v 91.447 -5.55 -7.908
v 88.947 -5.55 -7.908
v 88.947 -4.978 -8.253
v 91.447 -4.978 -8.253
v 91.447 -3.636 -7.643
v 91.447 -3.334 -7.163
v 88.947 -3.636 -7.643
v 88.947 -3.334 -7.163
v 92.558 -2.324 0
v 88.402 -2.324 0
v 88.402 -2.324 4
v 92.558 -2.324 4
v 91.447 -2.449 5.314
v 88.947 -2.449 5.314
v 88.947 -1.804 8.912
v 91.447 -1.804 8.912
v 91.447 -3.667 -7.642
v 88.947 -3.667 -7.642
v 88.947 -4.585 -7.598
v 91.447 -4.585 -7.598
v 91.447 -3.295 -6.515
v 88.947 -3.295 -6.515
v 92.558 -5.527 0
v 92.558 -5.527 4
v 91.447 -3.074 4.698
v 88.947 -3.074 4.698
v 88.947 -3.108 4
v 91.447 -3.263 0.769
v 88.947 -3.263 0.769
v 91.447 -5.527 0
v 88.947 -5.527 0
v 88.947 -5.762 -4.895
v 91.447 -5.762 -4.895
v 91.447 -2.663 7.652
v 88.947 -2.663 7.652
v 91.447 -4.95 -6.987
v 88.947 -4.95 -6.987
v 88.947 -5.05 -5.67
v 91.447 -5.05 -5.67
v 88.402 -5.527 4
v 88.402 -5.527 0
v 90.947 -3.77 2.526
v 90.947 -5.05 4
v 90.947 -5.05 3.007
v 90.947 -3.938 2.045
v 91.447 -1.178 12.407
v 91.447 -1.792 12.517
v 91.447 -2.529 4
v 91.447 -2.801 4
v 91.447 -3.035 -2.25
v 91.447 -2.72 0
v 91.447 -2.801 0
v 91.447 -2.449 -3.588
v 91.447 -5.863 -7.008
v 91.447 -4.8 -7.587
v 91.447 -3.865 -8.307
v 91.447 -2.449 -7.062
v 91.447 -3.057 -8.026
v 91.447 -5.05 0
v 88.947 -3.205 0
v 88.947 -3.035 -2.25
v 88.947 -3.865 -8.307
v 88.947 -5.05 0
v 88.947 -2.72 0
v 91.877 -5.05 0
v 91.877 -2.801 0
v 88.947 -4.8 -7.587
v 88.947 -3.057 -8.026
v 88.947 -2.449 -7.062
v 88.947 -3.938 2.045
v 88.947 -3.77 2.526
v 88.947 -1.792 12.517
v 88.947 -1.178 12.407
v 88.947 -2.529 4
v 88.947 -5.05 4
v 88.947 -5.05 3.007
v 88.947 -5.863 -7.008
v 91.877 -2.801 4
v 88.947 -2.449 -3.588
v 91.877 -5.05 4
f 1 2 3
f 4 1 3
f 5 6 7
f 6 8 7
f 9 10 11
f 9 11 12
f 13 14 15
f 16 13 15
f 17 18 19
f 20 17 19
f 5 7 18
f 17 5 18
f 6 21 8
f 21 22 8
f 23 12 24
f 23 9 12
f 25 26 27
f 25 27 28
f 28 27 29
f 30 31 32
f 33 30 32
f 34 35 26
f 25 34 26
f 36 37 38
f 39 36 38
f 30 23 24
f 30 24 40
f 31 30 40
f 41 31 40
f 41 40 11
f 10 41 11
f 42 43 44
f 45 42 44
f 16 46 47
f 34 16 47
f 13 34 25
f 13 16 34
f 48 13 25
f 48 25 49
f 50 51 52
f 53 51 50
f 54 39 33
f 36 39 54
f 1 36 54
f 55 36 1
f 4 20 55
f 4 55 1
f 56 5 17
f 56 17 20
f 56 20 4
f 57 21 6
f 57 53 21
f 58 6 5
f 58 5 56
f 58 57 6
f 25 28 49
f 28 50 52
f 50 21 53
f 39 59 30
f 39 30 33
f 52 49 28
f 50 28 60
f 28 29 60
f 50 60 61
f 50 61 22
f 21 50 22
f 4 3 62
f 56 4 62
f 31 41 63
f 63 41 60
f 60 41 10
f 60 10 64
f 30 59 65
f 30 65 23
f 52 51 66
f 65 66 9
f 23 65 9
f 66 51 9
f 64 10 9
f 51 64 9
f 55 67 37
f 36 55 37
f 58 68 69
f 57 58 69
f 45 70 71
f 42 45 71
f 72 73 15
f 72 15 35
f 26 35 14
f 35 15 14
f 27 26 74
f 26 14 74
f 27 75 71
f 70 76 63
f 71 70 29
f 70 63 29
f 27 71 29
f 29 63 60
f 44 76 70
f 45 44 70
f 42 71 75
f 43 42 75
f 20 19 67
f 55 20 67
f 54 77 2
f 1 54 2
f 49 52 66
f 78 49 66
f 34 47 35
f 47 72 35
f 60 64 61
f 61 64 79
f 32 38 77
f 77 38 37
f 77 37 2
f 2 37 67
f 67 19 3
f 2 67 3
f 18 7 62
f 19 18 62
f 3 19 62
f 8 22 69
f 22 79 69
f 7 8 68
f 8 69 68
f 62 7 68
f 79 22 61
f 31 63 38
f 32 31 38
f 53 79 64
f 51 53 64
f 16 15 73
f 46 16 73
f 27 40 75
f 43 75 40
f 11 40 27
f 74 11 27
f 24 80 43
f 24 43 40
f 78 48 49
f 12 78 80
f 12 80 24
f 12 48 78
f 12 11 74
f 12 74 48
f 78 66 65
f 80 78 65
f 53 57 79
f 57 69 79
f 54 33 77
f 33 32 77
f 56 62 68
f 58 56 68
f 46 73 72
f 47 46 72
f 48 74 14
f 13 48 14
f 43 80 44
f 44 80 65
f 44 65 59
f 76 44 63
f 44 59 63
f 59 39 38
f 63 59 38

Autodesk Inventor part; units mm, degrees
ref_plane "YZ Plane" through (0, 0, 0) normal (1, 0, 0) x (0, 1, 0)
ref_plane "XZ Plane" through (0, 0, 0) normal (0, 1, 0) x (-1, 0, 0)
ref_plane "XY Plane" through (0, 0, 0) normal (0, 0, 1) x (1, 0, 0)
sketch "Sketch1" plane through (0, 0, 0) normal (0, 0, 1) x (1, 0, 0)
  line L0 (92.558, -5.5266) -> (88.4016, -5.5266)
  line L1 (88.4016, -5.5266) -> (88.4016, -2.3241)
  line L2 (88.4016, -2.3241) -> (92.558, -2.3241)
  line L3 (92.558, -2.3241) -> (92.558, -5.5266)
  line L4 (91.8766, -5.0496) -> (88.9467, -5.0496)
  line L5 (88.9467, -5.0496) -> (88.9467, -2.8011)
  line L6 (88.9467, -2.8011) -> (91.8766, -2.8011)
  line L7 (91.8766, -2.8011) -> (91.8766, -5.0496)
  point P0 (0, 0)
extrude "Extrusion1" add sketch "Sketch1" along normal blind 4
sketch "Sketch3" plane through (92.558, -5.5266, 0) normal (1, 0, 0) x (0, 0, -1)
  line L0 (-4, 0) -> (-4, 3.2025) projected
  line L1 (0, 3.2025) -> (0, 0) projected
  point P0 (0, 5.5266)
sketch "Sketch4" plane through (88.9467, -5.0496, 0) normal (1, 0, 0) x (0, 0, -1)
  line L0 (0, 2.7255) -> (0, -0.477) projected
  line L1 (0, -0.477) -> (4.8951, -0.7122)
  line L2 (4.8951, -0.7122) -> (7.0077, -0.8137)
  line L3 (7.0077, -0.8137) -> (7.9085, -0.5009)
  line L4 (7.9085, -0.5009) -> (8.2533, 0.0718)
  line L5 (8.2533, 0.0718) -> (8.3068, 1.1847)
  line L6 (8.3068, 1.1847) -> (8.0262, 1.993)
  line L7 (8.0262, 1.993) -> (7.0621, 2.6005)
  line L8 (7.0621, 2.6005) -> (3.5876, 2.6005)
  line L9 (3.5876, 2.6005) -> (-0.3844, 2.3008)
  line L10 (-0.3844, 2.3008) -> (-5.3135, 2.6005)
  line L11 (-5.3135, 2.6005) -> (-8.9119, 3.2451)
  line L12 (-8.9119, 3.2451) -> (-12.4072, 3.8713)
  line L13 (-12.4072, 3.8713) -> (-12.517, 3.2581)
  line L14 (-12.517, 3.2581) -> (-7.6517, 2.3865)
  line L15 (-7.6517, 2.3865) -> (-4.6985, 1.9752)
  line L16 (-4.6985, 1.9752) -> (-0.7689, 1.7864)
  line L17 (-0.7689, 1.7864) -> (2.2504, 2.0142)
  line L18 (2.2504, 2.0142) -> (6.5148, 1.7549)
  line L19 (6.5148, 1.7549) -> (7.1634, 1.7155)
  line L20 (7.1634, 1.7155) -> (7.6433, 1.4131)
  line L21 (7.6433, 1.4131) -> (7.6418, 1.3822)
  line L22 (7.6418, 1.3822) -> (7.5978, 0.465)
  line L23 (7.5978, 0.465) -> (7.5874, 0.25)
  line L24 (7.5874, 0.25) -> (6.9873, 0.0994)
  line L25 (6.9873, 0.0994) -> (5.6698, 0)
  line L26 (0, 0) -> (-4, 0) projected
  line L27 (5.6698, 0) -> (0, 0)
  line L28 (0, 0) -> (0, -0.477)
  point P0 (0, 5.0496)
extrude "Extrusion2" add sketch "Sketch4" along normal blind 2.5 contours L27 L25 L24 L23 L22 L21 L20 L19 L18 L17 L0 L9 L8 L7 L6 L5 L4 L3 L2 L1 | L17 L16 L15 L14 L13 L12 L11 L10 L9 L0
sketch "Sketch5" plane through (88.9467, -5.0496, 4) normal (1, 0, 0) x (0, 0, -1)
  line L0 (4, 0) -> (0, 0) projected
  line L1 (0, 0) -> (0.9929, 0)
  line L2 (0.9929, 0) -> (1.9546, 1.1114)
  line L3 (1.9546, 1.1114) -> (1.4737, 1.2793)
  line L4 (0, 0) -> (0, 1.9416) projected
  line L5 (1.4737, 1.2793) -> (0, 0)
  point P0 (4, 5.0496)
extrude "Extrusion3" add sketch "Sketch5" along normal blind 2
properties part number "Ziptie"
